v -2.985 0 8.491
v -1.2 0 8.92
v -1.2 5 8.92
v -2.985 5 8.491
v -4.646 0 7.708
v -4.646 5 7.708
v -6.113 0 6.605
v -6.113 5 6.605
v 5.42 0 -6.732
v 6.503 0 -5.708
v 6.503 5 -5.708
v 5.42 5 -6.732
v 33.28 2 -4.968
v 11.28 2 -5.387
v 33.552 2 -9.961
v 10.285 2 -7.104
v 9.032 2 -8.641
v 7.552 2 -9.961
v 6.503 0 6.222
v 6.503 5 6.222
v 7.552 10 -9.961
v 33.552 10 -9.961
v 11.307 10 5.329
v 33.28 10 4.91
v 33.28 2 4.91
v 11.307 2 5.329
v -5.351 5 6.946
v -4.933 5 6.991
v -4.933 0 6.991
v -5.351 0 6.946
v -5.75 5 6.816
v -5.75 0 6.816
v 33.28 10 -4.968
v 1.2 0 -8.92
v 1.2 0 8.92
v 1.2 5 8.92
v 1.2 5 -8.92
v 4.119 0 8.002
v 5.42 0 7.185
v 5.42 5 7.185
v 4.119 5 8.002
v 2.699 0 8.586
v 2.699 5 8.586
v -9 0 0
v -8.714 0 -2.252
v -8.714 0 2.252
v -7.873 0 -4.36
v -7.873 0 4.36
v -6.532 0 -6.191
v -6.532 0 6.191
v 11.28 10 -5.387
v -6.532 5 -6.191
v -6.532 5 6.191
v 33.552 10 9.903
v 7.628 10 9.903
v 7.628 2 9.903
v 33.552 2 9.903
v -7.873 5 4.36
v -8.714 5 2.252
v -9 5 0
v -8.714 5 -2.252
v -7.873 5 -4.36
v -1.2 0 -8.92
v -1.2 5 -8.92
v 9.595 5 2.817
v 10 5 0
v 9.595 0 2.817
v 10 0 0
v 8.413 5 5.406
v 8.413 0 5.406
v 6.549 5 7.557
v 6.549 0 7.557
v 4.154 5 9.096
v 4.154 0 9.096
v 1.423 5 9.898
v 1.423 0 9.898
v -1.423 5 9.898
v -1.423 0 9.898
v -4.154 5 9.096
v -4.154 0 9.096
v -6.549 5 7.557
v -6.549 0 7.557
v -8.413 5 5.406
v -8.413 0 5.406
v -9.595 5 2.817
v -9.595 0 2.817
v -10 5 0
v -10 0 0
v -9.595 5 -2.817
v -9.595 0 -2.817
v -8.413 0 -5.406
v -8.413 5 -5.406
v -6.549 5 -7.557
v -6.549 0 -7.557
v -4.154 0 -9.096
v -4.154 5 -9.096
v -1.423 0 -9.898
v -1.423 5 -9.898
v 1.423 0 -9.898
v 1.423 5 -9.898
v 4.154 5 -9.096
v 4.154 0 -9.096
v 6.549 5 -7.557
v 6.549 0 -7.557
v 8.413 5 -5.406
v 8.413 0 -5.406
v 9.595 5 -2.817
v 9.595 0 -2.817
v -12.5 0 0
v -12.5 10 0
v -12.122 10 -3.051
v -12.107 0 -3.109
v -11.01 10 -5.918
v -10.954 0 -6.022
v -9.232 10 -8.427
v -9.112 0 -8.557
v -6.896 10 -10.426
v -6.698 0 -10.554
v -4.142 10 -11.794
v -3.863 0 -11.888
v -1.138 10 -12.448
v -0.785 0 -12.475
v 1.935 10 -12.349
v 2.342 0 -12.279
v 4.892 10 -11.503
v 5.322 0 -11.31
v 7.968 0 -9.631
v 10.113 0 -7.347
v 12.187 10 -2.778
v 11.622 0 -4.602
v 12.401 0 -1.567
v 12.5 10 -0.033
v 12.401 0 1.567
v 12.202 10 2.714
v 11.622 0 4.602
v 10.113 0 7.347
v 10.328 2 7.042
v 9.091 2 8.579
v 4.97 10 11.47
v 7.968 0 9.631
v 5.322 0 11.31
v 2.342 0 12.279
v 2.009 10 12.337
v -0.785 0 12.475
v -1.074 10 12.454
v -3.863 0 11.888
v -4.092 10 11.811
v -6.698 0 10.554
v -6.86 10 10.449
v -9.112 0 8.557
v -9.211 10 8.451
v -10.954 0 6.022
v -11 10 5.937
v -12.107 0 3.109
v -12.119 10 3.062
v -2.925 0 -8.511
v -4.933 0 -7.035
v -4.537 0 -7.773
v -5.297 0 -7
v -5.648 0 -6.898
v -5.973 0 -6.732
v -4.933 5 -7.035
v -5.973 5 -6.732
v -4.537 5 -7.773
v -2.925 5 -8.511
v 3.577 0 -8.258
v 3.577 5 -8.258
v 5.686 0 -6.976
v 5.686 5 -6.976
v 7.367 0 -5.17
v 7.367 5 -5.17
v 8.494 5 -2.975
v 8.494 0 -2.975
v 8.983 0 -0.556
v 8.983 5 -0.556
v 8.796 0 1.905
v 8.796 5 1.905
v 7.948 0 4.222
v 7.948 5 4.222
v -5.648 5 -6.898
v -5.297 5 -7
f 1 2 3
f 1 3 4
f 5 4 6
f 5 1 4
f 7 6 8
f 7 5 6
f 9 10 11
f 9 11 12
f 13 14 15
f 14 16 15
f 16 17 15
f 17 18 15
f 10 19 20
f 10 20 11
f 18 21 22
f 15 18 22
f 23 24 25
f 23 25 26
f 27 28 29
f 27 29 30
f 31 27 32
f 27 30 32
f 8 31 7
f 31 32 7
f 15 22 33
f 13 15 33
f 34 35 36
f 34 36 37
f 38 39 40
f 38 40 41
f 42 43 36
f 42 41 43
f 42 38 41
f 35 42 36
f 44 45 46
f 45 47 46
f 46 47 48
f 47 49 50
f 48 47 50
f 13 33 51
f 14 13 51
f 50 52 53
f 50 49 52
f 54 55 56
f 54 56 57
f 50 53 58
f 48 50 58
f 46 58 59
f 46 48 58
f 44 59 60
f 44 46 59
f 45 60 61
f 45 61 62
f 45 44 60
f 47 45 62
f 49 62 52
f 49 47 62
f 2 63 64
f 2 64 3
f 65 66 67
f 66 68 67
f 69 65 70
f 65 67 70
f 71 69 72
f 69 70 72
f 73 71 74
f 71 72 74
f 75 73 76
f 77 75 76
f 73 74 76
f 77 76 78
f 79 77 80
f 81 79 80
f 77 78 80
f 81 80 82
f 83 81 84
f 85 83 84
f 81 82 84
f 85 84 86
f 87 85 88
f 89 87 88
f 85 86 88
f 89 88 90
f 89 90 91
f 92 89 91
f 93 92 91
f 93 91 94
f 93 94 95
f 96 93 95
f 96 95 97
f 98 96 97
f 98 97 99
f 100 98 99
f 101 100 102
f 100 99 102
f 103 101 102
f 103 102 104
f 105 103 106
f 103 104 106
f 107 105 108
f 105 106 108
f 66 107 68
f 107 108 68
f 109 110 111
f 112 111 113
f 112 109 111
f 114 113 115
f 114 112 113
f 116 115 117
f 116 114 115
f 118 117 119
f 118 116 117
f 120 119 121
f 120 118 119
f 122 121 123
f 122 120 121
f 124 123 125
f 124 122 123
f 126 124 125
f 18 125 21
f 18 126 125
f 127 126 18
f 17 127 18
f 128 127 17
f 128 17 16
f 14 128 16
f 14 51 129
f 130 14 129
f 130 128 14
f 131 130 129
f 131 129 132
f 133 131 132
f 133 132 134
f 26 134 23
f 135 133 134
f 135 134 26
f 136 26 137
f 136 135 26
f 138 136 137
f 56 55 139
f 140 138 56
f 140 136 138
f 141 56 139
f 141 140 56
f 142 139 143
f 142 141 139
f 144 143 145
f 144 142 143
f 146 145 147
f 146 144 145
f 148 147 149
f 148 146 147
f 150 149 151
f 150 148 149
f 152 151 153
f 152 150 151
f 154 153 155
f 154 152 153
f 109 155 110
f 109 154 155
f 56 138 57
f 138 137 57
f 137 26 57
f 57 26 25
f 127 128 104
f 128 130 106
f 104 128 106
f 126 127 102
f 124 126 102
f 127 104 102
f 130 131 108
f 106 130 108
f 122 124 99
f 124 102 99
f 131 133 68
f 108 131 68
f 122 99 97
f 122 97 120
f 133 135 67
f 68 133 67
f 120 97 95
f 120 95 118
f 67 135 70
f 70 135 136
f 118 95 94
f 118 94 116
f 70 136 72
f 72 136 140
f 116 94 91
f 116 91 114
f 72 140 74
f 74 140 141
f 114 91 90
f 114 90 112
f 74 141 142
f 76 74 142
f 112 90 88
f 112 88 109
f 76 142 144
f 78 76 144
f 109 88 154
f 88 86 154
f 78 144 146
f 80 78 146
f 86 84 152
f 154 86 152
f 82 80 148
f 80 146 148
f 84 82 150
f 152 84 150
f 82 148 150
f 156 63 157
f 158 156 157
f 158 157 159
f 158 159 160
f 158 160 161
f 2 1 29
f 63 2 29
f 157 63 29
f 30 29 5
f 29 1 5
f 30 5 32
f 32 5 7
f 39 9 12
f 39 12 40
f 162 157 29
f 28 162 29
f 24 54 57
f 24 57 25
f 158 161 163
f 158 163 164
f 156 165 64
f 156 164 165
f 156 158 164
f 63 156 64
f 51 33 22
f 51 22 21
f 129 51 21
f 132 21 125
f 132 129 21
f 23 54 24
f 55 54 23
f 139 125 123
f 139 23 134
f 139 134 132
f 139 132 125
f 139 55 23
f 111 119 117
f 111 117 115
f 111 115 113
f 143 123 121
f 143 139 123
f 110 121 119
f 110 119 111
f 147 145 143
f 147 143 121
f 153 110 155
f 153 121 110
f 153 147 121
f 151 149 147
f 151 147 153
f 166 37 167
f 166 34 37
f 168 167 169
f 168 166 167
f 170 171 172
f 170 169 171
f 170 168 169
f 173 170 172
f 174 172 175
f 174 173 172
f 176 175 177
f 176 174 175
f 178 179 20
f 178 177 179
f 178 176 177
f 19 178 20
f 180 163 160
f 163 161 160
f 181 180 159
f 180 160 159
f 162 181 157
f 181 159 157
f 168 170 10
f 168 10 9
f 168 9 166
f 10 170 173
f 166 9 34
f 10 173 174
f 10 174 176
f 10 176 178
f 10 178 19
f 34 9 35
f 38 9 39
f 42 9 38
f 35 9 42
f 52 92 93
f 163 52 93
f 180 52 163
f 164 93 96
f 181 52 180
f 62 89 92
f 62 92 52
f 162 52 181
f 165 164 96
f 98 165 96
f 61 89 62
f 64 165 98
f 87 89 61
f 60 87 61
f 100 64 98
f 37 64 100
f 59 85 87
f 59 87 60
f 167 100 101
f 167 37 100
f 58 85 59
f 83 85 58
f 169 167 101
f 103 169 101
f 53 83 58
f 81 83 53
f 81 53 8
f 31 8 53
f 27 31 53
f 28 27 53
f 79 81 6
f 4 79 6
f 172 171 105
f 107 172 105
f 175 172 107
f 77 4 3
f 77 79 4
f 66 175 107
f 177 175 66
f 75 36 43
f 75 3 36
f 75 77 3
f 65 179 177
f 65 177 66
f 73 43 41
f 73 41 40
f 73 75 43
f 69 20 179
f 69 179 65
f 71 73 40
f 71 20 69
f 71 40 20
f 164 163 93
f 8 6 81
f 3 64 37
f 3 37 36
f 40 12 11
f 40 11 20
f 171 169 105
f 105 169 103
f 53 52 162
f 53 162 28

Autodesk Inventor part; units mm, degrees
ref_plane "YZ Plane" through (0, 0, 0) normal (1, 0, 0) x (0, 1, 0)
ref_plane "XZ Plane" through (0, 0, 0) normal (0, 1, 0) x (-1, 0, 0)
ref_plane "XY Plane" through (0, 0, 0) normal (0, 0, 1) x (1, 0, 0)
sketch "Sketch1" plane through (0, 0, 0) normal (0, 1, 0) x (-1, 0, 0)
  circle A0 centre (0, 0) radius 12.5
  circle A1 centre (0, 0) radius 10
  circle A2 centre (0, 0) radius 9
  dimension "d0" = 25
  dimension "d1" = 20
  dimension "d2" = 18
extrude "Extrusion1" add sketch "Sketch1" along normal blind 10 contours A0
sketch "Sketch2" plane through (0, 10, 0) normal (0, 1, 0) x (1, 0, 0)
  circle A0 centre (0, 0) radius 10
  circle A1 centre (0, 0) radius 9
  dimension "d5" = 18
extrude "Extrusion2" add sketch "Sketch2" against normal blind 10 contours A0 | A1
sketch "Sketch3" plane through (0, 0, 0) normal (0, -1, 0) x (1, 0, 0)
  circle A0 centre (0, 0) radius 10
  circle A1 centre (0, 0) radius 9
  dimension "d8" = 20
  dimension "d9" = 18
extrude "Extrusion3" cut sketch "Sketch3" against normal blind 5
sketch "Sketch4" plane through (0, 0, 0) normal (0, -1, 0) x (1, 0, 0)
  circle A0 centre (0, 0) radius 9 projected
  line L0 (-6.5324, -6.191) -> (-6.5324, 6.191)
  line L1 (-4.9332, -7.0348) -> (-4.9332, 6.9906)
  arc A1 (-4.9332, 6.9906) -> (-6.5324, 6.191) centre (-4.9332, 4.9917) ccw
  arc A2 (-6.5324, -6.191) -> (-4.9332, -7.0348) centre (-4.9332, -5.0977) ccw
  point P0 (-6.1136, 6.6049)
  point P1 (-5.9735, -6.7318)
extrude "Extrusion4" cut sketch "Sketch4" against normal blind 5 contours A0 A1 L1 A2 L0
sketch "Sketch5" plane through (0, 0, 0) normal (0, -1, 0) x (1, 0, 0)
  arc A0 (-5.9735, -6.7318) -> (-6.1136, 6.6049) centre (0, 0) ccw projected
  line L0 (-1.1999, -8.9197) -> (-1.1999, 8.9197)
  line L1 (1.1999, 8.9197) -> (1.1999, -8.9197)
  line L2 (6.5028, 6.222) -> (6.5028, -5.7075)
  line L3 (6.5028, -5.7075) -> (5.4199, -6.7318)
  line L4 (5.4199, -6.7318) -> (5.4199, 7.185)
extrude "Extrusion5" cut sketch "Sketch5" against normal blind 5 contours L0 A0 L1 | L2 L3 L4 A0
sketch "Sketch6" plane through (0, 10, 0) normal (0, 1, 0) x (1, 0, 0)
  circle A0 centre (0, 0) radius 12.5 projected
  line L0 (7.5517, 9.961) -> (33.5517, 9.961)
  line L1 (33.5517, 9.961) -> (33.2795, 4.9684)
  line L2 (33.2795, 4.9684) -> (11.2795, 5.3874)
  line L3 (13.1769, 0.0291) -> (33.0118, 0.0291)
  line L4 (7.5517, -9.9028) -> (33.5517, -9.9028)
  line L5 (33.5517, -9.9028) -> (33.2795, -4.9102)
  line L6 (33.2795, -4.9102) -> (11.2795, -5.3291)
  point P0 (11.3073, -5.3286)
  point P1 (7.6279, -9.9028)
  dimension "d16" = 26
  dimension "d17" = 5
  dimension "d18" = 22
extrude "Extrusion6" add sketch "Sketch6" against normal blind 8 contours A0 L0 L1 L2 | L6 L5 L4 A0
properties part number "ab"
